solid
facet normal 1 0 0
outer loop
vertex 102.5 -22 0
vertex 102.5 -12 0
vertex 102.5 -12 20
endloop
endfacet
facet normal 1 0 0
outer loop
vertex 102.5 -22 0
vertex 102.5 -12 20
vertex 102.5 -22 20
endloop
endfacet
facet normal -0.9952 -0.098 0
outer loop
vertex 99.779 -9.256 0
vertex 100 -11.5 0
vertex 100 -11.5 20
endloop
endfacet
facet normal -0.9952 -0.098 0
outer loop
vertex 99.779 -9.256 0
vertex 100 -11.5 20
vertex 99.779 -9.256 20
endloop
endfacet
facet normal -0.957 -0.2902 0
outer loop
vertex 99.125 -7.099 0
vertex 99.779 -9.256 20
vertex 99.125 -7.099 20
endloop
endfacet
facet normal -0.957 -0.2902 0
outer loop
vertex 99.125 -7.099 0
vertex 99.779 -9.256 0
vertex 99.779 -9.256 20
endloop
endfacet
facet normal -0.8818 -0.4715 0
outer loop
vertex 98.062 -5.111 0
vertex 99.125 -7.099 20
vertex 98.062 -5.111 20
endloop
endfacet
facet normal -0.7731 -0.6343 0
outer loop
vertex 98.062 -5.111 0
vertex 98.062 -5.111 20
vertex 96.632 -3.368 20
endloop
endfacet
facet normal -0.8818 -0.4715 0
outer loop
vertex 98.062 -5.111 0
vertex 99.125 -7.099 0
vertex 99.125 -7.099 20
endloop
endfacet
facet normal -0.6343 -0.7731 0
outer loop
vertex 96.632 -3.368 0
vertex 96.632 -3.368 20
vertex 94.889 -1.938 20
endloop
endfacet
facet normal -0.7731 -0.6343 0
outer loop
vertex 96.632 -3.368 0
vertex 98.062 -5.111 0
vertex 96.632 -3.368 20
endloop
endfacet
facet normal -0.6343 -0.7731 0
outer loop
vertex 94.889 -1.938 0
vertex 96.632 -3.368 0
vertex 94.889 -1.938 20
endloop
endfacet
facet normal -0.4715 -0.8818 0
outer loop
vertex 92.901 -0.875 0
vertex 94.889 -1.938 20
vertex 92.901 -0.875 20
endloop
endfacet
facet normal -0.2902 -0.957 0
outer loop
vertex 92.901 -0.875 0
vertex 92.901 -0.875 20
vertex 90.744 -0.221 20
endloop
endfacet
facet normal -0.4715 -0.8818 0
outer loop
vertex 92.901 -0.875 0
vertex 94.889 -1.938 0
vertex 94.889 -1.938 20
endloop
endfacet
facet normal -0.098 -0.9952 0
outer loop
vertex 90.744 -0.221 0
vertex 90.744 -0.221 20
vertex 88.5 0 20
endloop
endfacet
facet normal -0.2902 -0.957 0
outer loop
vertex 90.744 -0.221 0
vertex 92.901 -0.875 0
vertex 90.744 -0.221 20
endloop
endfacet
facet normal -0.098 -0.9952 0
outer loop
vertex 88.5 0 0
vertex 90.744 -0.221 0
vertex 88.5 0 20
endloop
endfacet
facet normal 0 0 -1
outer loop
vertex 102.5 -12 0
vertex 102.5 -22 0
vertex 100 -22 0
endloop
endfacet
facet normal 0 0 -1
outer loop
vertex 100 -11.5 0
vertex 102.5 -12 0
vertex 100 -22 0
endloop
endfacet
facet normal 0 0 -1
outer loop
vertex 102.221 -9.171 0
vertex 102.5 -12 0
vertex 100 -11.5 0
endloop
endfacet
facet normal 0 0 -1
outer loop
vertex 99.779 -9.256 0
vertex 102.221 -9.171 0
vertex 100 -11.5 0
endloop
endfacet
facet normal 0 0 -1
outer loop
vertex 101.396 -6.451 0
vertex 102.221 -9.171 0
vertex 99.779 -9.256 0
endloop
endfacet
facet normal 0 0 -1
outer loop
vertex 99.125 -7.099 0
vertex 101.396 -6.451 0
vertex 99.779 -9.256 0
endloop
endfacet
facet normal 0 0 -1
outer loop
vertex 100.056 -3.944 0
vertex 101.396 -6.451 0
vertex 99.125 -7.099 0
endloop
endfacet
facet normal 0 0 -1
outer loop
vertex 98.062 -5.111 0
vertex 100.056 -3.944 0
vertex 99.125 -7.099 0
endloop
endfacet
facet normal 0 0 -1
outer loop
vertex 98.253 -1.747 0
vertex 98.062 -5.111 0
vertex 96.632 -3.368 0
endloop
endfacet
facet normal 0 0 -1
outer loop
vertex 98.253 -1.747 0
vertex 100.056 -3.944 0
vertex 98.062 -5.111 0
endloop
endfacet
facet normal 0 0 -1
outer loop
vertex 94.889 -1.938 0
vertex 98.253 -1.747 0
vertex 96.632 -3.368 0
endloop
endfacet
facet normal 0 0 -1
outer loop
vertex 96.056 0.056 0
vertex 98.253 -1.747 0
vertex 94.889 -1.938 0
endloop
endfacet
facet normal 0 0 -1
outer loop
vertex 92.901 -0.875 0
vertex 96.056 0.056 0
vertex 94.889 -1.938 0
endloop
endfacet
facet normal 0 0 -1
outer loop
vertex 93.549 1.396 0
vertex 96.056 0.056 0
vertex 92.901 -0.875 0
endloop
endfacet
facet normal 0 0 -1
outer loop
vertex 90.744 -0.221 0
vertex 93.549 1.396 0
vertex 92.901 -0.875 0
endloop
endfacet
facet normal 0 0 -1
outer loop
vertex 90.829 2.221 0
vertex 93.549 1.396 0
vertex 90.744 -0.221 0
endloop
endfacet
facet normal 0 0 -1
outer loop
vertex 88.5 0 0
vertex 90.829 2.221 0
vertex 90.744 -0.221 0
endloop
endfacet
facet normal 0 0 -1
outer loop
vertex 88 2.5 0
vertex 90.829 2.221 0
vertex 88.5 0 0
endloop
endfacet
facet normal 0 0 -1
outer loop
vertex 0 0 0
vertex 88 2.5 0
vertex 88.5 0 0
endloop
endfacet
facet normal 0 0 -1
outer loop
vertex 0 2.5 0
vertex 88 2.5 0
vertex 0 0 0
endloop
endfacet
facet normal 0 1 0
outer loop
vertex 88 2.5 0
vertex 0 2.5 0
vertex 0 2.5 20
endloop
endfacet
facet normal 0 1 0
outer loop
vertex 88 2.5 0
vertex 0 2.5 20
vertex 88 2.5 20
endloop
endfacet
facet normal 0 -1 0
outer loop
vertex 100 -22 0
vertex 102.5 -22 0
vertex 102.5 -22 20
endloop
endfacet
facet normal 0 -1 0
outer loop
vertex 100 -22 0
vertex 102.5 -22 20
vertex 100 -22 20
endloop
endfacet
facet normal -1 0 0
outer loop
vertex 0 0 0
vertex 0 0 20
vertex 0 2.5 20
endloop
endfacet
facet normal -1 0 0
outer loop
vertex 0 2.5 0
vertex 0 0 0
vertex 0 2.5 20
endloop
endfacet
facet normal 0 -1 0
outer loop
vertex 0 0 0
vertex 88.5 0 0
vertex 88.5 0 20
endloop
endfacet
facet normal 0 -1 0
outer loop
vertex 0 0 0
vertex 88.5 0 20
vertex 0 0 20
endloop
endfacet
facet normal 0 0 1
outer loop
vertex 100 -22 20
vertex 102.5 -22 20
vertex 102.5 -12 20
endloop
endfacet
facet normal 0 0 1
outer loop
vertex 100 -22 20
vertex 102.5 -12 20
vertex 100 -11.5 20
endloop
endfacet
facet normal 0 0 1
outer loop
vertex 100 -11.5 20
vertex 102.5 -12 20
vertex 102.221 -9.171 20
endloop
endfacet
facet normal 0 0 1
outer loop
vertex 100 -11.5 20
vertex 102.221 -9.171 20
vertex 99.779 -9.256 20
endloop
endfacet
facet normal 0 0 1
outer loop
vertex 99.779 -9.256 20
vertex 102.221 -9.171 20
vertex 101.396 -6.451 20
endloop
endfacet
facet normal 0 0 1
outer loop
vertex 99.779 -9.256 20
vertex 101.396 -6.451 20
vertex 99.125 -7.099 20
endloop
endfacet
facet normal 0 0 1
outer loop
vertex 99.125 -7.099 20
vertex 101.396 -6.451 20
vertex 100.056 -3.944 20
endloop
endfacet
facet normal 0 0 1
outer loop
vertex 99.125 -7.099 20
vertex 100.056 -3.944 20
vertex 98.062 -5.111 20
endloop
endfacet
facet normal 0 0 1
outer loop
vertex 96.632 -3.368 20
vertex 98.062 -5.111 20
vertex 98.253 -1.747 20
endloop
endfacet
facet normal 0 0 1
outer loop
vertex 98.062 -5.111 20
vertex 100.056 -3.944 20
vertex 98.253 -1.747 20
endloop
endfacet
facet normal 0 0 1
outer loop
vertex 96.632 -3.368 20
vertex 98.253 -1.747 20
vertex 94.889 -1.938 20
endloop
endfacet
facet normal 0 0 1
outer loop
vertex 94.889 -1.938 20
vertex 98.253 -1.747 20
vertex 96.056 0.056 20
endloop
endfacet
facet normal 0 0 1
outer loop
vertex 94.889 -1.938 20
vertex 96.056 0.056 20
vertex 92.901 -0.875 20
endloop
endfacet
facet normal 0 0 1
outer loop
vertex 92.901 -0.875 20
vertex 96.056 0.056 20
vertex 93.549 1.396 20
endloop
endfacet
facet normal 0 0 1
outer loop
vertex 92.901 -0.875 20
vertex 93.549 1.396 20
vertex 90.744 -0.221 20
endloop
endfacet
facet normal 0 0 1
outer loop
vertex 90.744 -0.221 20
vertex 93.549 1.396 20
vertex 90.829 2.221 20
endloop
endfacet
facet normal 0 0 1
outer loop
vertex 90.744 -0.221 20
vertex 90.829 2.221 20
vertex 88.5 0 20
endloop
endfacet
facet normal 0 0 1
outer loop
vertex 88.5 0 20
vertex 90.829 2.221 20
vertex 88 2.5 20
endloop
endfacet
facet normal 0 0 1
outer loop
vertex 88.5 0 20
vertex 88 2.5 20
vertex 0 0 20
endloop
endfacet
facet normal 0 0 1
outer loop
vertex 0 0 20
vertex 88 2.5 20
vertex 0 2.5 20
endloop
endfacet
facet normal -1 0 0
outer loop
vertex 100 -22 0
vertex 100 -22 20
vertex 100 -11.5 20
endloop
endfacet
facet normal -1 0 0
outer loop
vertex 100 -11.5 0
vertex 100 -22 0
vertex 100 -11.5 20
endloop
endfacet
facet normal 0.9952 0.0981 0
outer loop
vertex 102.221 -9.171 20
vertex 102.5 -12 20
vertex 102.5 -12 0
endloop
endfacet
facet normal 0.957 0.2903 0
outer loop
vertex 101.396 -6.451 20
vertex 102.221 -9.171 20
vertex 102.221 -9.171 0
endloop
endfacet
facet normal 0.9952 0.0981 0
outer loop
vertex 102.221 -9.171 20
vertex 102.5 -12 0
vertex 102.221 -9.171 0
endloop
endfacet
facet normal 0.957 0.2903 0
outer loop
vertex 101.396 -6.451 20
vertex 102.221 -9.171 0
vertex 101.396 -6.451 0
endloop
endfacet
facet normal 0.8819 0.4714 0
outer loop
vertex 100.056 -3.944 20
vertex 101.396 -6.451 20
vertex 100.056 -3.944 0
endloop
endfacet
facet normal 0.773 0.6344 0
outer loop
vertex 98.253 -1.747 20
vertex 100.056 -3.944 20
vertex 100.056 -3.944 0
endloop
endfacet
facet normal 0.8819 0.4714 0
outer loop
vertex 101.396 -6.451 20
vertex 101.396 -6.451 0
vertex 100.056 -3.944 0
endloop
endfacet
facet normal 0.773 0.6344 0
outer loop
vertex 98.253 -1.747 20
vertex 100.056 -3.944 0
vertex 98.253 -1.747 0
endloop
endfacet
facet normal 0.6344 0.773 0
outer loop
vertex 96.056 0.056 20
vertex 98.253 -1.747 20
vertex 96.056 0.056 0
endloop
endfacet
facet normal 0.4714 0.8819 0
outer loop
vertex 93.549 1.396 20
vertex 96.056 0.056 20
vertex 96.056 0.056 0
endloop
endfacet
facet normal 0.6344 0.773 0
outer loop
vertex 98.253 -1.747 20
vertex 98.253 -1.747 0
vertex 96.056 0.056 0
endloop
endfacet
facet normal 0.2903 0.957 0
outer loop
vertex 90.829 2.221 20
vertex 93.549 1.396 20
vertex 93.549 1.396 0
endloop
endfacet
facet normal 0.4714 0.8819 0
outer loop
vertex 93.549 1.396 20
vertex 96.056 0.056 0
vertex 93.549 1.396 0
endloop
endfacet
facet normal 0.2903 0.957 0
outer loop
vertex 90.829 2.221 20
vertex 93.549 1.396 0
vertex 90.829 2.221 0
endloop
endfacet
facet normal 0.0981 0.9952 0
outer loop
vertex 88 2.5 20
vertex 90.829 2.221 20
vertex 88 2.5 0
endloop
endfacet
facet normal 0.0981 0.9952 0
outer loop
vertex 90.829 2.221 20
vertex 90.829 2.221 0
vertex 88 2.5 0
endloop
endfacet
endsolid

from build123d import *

# Parameters (mm, degrees)
PAD_DEPTH            = 20
BODY_PLACEMENT_ANGLE = 90


with BuildPart() as part:
    # Sketch → Pad (new body)
    with BuildSketch(Plane.XZ):
        with BuildLine():
            Line((0, 2.5), (88, 2.5))
            ThreePointArc((102.5, -12), (98.253048, -1.746952), (88, 2.5))
            Line((102.5, -12), (102.5, -22))
            Line((102.5, -22), (100, -22))
            Line((100, -22), (100, -11.5))
            ThreePointArc((100, -11.5), (96.631728, -3.368272), (88.5, 0))
            Line((88.5, 0), (0, 0))
            Line((0, 0), (0, 2.5))
        make_face()
    extrude(amount=PAD_DEPTH)


with BuildPart() as part_1:
    # Body placement: moved
    add(part.part.rotate(Axis((0, 0, 0), (-1, 0, 0)), BODY_PLACEMENT_ANGLE))


solid = part_1.part
